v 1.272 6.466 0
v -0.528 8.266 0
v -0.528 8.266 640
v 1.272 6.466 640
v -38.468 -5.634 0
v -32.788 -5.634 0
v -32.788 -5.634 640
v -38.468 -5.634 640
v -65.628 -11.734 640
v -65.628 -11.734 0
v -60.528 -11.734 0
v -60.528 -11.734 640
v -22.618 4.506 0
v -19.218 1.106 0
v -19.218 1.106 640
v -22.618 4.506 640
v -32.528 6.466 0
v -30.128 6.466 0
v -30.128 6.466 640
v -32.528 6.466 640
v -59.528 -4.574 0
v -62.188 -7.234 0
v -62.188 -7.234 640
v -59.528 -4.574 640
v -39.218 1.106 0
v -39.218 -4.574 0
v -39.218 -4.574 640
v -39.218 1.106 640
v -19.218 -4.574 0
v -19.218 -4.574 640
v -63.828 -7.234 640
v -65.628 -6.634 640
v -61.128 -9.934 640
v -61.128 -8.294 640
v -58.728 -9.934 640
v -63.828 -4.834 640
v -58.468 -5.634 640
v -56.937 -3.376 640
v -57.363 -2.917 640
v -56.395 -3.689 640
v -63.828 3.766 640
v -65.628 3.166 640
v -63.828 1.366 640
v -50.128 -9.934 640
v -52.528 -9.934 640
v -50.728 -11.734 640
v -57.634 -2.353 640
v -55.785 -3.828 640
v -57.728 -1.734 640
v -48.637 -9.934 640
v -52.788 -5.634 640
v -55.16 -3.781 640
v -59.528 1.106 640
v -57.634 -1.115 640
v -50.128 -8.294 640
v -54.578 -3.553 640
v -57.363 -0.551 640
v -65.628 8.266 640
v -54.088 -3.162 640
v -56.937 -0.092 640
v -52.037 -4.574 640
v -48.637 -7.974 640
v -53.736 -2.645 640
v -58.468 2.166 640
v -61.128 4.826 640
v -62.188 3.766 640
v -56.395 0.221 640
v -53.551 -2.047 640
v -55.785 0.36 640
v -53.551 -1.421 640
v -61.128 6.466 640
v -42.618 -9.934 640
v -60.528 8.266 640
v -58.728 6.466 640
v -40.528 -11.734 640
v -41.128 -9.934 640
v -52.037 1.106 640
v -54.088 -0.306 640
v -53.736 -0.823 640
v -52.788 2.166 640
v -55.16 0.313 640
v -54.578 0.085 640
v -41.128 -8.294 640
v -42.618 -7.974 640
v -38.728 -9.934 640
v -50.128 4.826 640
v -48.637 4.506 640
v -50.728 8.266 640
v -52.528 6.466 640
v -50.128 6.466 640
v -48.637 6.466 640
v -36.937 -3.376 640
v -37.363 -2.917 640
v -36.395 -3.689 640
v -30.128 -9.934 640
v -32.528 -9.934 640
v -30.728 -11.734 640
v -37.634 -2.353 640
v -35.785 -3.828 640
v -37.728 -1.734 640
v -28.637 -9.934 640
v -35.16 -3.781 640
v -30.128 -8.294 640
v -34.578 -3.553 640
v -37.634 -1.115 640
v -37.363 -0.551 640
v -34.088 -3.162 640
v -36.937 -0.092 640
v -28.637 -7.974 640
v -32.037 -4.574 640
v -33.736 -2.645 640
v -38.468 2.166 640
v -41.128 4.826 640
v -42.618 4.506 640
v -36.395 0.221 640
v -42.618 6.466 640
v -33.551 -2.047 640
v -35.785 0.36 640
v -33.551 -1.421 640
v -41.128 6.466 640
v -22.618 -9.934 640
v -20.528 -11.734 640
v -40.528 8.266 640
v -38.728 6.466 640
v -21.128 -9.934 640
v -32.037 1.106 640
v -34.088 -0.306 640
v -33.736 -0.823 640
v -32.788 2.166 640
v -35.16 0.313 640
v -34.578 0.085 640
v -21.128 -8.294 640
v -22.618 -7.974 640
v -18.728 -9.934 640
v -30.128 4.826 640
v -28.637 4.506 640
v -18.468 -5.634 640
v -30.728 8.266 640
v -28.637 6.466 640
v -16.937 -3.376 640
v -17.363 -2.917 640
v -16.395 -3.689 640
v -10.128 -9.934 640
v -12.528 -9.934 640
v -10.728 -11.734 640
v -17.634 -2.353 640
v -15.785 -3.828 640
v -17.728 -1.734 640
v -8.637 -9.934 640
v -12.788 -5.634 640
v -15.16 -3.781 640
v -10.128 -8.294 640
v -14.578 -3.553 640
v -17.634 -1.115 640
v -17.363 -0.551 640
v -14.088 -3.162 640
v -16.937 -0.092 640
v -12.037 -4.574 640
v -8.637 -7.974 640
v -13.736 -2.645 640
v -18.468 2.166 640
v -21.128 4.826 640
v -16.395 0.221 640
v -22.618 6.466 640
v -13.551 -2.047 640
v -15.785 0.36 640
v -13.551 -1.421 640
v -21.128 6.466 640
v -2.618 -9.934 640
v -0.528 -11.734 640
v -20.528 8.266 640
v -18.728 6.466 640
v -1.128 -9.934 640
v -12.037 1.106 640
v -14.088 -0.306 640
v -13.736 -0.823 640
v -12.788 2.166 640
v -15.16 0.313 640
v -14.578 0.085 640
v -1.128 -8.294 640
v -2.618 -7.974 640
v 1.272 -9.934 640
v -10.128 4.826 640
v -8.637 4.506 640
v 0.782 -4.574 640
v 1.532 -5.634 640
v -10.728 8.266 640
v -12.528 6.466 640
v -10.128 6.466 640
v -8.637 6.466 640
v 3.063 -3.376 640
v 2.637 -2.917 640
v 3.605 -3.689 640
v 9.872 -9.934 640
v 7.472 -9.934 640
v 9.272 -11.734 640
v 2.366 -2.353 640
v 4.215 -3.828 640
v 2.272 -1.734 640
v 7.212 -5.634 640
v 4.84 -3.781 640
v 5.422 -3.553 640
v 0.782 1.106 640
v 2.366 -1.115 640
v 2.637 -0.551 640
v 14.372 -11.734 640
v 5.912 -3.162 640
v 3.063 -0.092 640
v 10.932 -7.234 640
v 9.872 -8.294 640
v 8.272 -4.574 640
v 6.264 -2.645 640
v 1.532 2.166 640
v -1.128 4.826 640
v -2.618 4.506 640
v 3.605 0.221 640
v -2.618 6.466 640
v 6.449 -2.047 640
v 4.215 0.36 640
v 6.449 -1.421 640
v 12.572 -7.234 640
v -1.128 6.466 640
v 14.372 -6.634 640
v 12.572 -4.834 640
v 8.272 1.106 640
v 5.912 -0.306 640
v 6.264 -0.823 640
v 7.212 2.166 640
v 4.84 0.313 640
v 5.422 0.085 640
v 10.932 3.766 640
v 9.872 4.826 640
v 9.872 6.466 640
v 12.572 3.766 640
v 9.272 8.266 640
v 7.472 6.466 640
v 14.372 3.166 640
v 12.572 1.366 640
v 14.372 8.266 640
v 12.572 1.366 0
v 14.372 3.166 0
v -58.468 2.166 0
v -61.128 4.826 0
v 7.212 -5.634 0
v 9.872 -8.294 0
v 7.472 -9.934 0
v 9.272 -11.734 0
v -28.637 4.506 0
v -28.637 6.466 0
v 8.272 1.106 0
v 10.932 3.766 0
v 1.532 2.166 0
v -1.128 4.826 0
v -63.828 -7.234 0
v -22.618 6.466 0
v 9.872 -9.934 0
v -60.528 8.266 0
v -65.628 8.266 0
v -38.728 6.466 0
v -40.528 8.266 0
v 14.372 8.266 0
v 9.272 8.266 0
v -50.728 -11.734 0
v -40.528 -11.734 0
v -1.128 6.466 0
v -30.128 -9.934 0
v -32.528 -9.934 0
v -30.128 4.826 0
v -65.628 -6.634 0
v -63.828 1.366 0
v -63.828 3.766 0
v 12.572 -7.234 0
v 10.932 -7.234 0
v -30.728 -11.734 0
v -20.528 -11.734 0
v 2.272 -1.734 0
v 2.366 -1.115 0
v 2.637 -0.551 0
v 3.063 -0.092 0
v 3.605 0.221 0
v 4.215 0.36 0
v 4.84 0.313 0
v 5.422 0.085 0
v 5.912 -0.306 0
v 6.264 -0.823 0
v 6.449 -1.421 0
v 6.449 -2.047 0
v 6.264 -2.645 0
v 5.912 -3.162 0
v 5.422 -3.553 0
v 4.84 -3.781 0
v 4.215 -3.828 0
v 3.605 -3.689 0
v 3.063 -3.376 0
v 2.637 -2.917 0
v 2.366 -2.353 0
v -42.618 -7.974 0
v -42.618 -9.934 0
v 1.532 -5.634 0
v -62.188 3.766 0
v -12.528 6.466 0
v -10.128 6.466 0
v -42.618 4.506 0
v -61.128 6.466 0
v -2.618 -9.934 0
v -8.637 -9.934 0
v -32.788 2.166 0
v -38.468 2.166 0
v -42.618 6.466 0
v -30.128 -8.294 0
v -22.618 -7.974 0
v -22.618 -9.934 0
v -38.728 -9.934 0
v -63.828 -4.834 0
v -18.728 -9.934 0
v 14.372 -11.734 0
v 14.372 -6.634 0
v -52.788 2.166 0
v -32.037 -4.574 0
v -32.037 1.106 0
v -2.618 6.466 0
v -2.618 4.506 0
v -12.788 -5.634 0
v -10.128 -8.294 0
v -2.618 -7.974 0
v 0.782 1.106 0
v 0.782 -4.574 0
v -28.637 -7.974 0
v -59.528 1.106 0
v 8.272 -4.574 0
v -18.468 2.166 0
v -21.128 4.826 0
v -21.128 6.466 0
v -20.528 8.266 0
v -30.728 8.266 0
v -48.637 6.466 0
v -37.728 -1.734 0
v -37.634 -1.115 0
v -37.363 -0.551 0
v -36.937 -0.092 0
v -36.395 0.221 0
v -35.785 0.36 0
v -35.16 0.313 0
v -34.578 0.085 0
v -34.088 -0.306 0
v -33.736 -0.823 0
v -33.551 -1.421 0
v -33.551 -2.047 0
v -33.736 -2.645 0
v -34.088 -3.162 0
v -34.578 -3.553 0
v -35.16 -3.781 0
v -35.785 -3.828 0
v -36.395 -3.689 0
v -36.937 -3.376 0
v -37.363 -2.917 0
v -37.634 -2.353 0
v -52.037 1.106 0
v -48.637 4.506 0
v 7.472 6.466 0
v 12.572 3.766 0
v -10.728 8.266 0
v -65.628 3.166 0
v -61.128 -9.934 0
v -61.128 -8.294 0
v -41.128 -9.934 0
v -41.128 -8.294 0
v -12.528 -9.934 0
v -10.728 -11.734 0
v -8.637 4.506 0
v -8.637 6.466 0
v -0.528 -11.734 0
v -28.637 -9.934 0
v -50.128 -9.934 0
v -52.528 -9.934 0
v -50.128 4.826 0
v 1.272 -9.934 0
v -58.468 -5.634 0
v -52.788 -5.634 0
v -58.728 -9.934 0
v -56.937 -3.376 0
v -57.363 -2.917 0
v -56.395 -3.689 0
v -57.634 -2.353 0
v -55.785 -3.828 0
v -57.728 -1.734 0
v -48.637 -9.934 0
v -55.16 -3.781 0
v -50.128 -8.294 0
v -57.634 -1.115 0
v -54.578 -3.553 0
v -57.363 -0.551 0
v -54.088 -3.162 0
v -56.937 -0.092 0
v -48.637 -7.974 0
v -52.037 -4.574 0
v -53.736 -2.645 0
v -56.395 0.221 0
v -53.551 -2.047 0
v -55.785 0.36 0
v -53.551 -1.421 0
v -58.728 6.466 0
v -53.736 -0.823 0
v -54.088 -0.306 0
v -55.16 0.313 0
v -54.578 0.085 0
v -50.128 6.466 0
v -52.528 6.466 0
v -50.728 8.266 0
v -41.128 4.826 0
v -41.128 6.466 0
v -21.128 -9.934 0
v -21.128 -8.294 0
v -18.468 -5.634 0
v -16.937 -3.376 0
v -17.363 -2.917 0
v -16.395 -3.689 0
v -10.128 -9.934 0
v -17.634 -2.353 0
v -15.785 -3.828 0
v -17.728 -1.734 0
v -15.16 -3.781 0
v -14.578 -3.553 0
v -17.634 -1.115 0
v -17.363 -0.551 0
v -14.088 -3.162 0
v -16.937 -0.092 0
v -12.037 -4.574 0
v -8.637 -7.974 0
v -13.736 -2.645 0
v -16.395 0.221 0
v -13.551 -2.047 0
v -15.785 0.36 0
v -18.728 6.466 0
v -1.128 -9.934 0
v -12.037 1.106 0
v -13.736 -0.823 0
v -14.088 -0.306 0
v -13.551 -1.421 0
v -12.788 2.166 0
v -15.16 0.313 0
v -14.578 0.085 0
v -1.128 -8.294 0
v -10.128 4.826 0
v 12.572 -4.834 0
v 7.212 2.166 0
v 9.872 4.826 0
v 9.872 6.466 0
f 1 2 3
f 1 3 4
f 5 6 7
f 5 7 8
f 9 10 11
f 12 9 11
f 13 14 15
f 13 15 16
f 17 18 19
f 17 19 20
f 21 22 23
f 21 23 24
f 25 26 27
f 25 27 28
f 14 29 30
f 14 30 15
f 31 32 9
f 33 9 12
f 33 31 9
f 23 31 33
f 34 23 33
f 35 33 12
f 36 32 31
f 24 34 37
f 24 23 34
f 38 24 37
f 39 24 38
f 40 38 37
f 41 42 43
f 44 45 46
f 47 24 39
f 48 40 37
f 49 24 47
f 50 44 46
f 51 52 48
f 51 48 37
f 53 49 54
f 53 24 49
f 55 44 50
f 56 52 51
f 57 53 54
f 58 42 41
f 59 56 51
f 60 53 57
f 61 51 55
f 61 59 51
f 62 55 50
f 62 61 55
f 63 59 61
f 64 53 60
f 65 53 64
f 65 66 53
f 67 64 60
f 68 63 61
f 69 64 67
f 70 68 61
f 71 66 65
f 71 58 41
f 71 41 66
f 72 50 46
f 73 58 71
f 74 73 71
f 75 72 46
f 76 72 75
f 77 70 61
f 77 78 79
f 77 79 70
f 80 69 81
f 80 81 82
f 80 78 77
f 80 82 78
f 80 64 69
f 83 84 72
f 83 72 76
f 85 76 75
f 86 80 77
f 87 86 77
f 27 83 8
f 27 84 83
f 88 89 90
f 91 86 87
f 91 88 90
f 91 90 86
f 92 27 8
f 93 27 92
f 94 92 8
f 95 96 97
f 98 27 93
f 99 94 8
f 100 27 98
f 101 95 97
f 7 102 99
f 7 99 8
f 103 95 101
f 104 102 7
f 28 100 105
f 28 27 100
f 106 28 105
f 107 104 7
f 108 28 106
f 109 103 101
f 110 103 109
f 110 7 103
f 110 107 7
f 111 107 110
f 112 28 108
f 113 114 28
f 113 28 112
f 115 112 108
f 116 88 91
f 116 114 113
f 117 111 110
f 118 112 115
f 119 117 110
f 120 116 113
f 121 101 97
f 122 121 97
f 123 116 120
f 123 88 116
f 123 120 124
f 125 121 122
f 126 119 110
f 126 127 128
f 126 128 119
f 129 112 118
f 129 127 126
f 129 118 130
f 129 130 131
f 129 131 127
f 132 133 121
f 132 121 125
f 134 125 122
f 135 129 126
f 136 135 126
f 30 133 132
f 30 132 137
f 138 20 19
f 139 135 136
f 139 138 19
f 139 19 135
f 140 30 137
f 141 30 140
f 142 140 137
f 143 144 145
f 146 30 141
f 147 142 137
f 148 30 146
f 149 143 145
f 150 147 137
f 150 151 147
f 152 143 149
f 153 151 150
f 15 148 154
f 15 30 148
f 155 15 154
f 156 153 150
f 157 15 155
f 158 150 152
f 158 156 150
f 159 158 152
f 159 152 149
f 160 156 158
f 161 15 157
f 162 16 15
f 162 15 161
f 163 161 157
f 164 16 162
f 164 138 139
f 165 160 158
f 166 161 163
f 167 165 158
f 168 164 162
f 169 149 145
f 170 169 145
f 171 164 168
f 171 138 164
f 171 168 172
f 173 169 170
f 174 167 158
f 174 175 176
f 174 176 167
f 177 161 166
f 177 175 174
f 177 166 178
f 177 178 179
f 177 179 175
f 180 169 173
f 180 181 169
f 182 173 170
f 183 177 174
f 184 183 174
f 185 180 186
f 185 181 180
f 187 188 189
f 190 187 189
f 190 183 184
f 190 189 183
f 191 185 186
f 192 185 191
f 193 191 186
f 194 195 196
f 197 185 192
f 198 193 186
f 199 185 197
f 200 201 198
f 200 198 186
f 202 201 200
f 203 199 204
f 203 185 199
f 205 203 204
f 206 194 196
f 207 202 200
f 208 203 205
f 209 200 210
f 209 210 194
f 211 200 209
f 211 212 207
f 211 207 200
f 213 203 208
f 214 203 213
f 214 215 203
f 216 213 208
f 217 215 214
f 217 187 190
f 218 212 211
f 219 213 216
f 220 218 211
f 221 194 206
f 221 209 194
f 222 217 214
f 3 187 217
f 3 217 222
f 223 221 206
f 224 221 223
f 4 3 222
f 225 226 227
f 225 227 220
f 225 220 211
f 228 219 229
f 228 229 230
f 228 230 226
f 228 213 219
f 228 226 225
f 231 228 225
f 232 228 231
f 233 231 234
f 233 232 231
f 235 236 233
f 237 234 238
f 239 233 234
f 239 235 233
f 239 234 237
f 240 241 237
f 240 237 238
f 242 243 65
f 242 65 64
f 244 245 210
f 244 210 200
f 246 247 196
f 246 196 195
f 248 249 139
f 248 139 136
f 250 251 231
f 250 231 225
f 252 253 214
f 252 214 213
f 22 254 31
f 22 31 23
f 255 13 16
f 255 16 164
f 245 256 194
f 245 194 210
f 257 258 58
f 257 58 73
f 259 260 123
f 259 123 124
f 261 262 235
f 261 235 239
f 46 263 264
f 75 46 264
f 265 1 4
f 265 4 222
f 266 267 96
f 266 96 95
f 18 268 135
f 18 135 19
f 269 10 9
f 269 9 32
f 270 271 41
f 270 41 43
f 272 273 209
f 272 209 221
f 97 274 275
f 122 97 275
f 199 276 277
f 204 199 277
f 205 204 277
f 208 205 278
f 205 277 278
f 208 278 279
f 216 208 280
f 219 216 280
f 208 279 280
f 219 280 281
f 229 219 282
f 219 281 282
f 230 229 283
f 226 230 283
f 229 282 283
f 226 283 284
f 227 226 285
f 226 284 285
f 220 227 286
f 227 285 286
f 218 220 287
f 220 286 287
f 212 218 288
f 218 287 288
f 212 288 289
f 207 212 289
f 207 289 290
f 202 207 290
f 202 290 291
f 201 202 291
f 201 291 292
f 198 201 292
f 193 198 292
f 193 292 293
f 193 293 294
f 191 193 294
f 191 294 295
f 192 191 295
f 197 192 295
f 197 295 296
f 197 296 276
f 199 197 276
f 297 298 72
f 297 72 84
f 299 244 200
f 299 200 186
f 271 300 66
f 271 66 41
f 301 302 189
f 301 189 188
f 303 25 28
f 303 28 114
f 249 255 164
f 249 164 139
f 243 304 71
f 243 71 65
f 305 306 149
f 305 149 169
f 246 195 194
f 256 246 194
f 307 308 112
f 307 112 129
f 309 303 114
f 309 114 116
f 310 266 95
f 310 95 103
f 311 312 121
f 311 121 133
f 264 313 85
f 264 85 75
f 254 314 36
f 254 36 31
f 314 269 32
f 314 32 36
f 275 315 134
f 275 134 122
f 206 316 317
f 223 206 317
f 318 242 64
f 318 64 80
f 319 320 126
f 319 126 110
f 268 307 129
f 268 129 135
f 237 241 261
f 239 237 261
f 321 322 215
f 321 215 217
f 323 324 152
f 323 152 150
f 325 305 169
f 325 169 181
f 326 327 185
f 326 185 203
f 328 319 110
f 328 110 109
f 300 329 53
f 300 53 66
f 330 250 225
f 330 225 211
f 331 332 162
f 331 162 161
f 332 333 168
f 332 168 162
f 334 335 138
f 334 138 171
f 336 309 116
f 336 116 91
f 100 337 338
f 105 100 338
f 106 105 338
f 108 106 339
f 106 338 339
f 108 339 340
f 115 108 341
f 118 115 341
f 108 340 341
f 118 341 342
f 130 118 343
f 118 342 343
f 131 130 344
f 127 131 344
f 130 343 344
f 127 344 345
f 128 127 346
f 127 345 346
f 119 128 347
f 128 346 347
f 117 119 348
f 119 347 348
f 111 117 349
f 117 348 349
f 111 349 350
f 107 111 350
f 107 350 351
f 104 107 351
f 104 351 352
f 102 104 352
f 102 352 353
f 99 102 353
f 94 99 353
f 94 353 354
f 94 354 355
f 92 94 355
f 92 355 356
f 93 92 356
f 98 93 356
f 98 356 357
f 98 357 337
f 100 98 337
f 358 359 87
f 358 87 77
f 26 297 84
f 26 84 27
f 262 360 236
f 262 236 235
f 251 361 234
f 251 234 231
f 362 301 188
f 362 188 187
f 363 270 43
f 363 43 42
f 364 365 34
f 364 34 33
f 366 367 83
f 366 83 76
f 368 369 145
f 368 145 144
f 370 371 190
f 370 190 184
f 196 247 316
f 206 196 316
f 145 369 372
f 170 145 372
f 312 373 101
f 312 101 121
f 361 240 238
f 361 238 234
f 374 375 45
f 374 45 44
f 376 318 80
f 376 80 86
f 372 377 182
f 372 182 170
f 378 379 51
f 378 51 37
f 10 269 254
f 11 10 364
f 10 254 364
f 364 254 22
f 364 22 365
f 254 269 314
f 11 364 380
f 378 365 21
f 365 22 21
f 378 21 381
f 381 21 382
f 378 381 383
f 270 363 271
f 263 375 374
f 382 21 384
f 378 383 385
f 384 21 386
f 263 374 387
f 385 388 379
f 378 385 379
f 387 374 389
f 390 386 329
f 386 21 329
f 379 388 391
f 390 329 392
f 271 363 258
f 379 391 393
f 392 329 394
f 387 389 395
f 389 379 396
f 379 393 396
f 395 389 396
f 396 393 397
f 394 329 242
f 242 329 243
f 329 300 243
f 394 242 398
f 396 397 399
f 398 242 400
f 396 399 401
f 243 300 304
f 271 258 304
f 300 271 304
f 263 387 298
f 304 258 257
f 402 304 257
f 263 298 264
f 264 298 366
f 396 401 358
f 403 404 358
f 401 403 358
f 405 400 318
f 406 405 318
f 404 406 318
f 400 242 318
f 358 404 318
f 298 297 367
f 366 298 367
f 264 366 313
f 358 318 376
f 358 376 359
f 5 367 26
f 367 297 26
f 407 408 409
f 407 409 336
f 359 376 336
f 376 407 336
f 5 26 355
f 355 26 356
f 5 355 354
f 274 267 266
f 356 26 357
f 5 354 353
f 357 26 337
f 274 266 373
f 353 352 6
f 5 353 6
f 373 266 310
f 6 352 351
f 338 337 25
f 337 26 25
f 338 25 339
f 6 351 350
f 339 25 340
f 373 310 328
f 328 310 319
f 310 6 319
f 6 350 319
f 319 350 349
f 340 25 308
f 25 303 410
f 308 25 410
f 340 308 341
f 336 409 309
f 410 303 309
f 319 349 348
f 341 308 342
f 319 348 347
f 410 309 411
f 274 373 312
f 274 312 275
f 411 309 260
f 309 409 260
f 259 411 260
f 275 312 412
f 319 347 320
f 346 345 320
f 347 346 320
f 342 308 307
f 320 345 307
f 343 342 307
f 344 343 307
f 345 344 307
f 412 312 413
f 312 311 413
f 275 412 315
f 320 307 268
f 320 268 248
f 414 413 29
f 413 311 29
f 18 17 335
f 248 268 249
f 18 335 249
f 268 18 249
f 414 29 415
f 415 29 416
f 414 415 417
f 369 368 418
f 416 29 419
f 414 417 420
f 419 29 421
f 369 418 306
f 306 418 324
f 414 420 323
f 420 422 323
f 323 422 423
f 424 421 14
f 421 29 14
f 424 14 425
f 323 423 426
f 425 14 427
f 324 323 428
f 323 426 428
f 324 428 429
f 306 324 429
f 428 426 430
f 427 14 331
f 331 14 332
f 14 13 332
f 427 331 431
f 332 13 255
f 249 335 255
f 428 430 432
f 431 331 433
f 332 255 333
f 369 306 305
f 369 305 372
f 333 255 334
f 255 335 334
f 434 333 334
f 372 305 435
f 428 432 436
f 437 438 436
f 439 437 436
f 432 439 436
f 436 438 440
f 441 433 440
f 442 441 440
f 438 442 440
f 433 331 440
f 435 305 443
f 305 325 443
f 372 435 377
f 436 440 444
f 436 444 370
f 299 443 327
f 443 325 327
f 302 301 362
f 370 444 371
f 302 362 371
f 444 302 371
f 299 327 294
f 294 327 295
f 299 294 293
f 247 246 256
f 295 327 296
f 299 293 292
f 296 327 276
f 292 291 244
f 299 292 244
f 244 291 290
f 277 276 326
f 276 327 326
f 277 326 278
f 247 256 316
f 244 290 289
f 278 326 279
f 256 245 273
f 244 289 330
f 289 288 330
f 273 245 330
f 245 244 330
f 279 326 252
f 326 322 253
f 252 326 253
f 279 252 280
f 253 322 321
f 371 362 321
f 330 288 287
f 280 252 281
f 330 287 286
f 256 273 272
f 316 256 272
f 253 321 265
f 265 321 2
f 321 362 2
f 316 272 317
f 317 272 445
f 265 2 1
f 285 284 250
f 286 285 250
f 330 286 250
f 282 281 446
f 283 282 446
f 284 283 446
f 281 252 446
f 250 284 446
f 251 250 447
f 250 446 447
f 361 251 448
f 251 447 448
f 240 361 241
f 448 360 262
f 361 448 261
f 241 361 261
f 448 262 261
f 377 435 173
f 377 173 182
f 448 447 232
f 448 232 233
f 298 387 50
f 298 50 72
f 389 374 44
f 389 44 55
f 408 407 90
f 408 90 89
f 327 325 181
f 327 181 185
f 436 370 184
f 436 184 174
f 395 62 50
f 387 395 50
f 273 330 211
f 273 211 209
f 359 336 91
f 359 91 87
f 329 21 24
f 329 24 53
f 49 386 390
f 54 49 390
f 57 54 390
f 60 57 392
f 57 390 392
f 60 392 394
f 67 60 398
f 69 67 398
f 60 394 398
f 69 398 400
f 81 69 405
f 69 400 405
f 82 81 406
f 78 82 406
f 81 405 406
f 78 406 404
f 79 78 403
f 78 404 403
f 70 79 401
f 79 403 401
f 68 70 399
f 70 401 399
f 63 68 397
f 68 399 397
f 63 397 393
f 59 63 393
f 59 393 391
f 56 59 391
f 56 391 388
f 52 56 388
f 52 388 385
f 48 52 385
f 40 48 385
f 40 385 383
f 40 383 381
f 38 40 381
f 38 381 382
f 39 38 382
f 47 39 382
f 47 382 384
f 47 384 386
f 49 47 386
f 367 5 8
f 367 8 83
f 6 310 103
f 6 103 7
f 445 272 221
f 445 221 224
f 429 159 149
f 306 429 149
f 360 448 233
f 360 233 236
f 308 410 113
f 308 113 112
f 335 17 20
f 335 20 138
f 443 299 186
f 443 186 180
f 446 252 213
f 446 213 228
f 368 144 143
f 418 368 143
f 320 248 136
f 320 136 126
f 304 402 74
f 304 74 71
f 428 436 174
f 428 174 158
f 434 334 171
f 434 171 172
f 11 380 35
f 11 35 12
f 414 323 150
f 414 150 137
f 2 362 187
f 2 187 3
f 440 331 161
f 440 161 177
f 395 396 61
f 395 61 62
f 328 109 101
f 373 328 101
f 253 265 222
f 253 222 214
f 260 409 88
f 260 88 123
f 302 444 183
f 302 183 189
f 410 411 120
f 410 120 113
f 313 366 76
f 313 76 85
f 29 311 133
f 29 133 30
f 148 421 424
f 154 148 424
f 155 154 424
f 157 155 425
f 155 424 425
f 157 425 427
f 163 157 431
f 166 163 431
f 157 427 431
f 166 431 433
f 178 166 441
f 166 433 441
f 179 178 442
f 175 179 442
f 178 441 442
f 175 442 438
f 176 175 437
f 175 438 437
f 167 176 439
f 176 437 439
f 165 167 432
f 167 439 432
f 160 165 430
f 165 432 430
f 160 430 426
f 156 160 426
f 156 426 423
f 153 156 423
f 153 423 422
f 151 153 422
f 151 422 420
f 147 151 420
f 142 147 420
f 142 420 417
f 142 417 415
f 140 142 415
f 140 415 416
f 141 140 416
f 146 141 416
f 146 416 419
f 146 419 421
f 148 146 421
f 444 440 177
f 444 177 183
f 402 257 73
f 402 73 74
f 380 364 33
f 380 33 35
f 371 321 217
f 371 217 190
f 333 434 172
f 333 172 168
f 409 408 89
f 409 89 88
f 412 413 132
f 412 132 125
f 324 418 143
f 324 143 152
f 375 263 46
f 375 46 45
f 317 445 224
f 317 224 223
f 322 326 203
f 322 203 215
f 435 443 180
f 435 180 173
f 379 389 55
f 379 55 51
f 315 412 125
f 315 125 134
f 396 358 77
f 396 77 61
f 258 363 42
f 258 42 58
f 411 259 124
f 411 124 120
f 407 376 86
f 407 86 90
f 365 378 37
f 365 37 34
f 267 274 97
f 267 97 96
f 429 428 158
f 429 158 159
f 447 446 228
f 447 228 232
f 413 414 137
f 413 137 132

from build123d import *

# Parameters (mm, degrees)
ESQUISSE1_W             = 80
ESQUISSE1_H             = 20
BOSS_EXTRU_1_DEPTH      = 640
ENL_V_MAT_EXTRU_1_REACH = 645.463
ESQUISSE2_R             = 2.1
ENL_V_MAT_EXTRU_2_REACH = 645.463


with BuildPart() as part:
    # Esquisse1 → Boss.-Extru.1 (new body)
    with BuildSketch(Plane.XY):
        with Locations((-25.62771875, -1.733873274)):
            Rectangle(ESQUISSE1_W, ESQUISSE1_H)
    extrude(amount=BOSS_EXTRU_1_DEPTH)

    # Esquisse2 → Enlèv. mat.-Extru.1 (cut, up to next)
    with BuildSketch(Plane(origin=(0, 0, 0), x_dir=(-1, 0, 0), z_dir=(0, 0, -1)), mode=Mode.PRIVATE) as enl_v_mat_extru_1_sk1:
        with Locations((55.62771875, -1.733873274)):
            Circle(ESQUISSE2_R)
    enl_v_mat_extru_1_tool1 = extrude(enl_v_mat_extru_1_sk1.sketch, amount=-ENL_V_MAT_EXTRU_1_REACH, mode=Mode.PRIVATE) & part.part
    # Esquisse2 → Enlèv. mat.-Extru.1 (cut, up to next)
    with BuildSketch(Plane(origin=(0, 0, 0), x_dir=(-1, 0, 0), z_dir=(0, 0, -1)), mode=Mode.PRIVATE) as enl_v_mat_extru_1_sk2:
        with Locations((35.62771875, -1.733873274)):
            Circle(ESQUISSE2_R)
    enl_v_mat_extru_1_tool2 = extrude(enl_v_mat_extru_1_sk2.sketch, amount=-ENL_V_MAT_EXTRU_1_REACH, mode=Mode.PRIVATE) & part.part
    # Esquisse2 → Enlèv. mat.-Extru.1 (cut, up to next)
    with BuildSketch(Plane(origin=(0, 0, 0), x_dir=(-1, 0, 0), z_dir=(0, 0, -1)), mode=Mode.PRIVATE) as enl_v_mat_extru_1_sk3:
        with Locations((15.62771875, -1.733873274)):
            Circle(ESQUISSE2_R)
    enl_v_mat_extru_1_tool3 = extrude(enl_v_mat_extru_1_sk3.sketch, amount=-ENL_V_MAT_EXTRU_1_REACH, mode=Mode.PRIVATE) & part.part
    # Esquisse2 → Enlèv. mat.-Extru.1 (cut, up to next)
    with BuildSketch(Plane(origin=(0, 0, 0), x_dir=(-1, 0, 0), z_dir=(0, 0, -1)), mode=Mode.PRIVATE) as enl_v_mat_extru_1_sk4:
        with Locations((-4.37228125, -1.733873274)):
            Circle(ESQUISSE2_R)
    enl_v_mat_extru_1_tool4 = extrude(enl_v_mat_extru_1_sk4.sketch, amount=-ENL_V_MAT_EXTRU_1_REACH, mode=Mode.PRIVATE) & part.part
    # Esquisse2 → Enlèv. mat.-Extru.1 (cut, up to next)
    with BuildSketch(Plane(origin=(0, 0, 0), x_dir=(-1, 0, 0), z_dir=(0, 0, -1)), mode=Mode.PRIVATE) as enl_v_mat_extru_1_sk5:
        Polygon((50.72771875, 8.266126726), (60.52771875, 8.266126726), (58.72771875, 6.466126726), (61.12771875, 6.466126726), (61.12771875, 4.826126726), (58.46771875, 2.166126726), (52.78771875, 2.166126726), (50.12771875, 4.826126726), (50.12771875, 6.466126726), (52.52771875, 6.466126726), align=None)
    enl_v_mat_extru_1_tool5 = extrude(enl_v_mat_extru_1_sk5.sketch, amount=-ENL_V_MAT_EXTRU_1_REACH, mode=Mode.PRIVATE) & part.part
    # Esquisse2 → Enlèv. mat.-Extru.1 (cut, up to next)
    with BuildSketch(Plane(origin=(0, 0, 0), x_dir=(-1, 0, 0), z_dir=(0, 0, -1)), mode=Mode.PRIVATE) as enl_v_mat_extru_1_sk6:
        Polygon((65.62771875, 3.166126726), (65.62771875, -6.633873274), (63.82771875, -4.833873274), (63.82771875, -7.233873274), (62.18771875, -7.233873274), (59.52771875, -4.573873274), (59.52771875, 1.106126726), (62.18771875, 3.766126726), (63.82771875, 3.766126726), (63.82771875, 1.366126726), align=None)
    enl_v_mat_extru_1_tool6 = extrude(enl_v_mat_extru_1_sk6.sketch, amount=-ENL_V_MAT_EXTRU_1_REACH, mode=Mode.PRIVATE) & part.part
    # Esquisse2 → Enlèv. mat.-Extru.1 (cut, up to next)
    with BuildSketch(Plane(origin=(0, 0, 0), x_dir=(-1, 0, 0), z_dir=(0, 0, -1)), mode=Mode.PRIVATE) as enl_v_mat_extru_1_sk7:
        Polygon((60.52771875, -11.733873274), (50.72771875, -11.733873274), (52.52771875, -9.933873274), (50.12771875, -9.933873274), (50.12771875, -8.293873274), (52.78771875, -5.633873274), (58.46771875, -5.633873274), (61.12771875, -8.293873274), (61.12771875, -9.933873274), (58.72771875, -9.933873274), align=None)
    enl_v_mat_extru_1_tool7 = extrude(enl_v_mat_extru_1_sk7.sketch, amount=-ENL_V_MAT_EXTRU_1_REACH, mode=Mode.PRIVATE) & part.part
    # Esquisse2 → Enlèv. mat.-Extru.1 (cut, up to next)
    with BuildSketch(Plane(origin=(0, 0, 0), x_dir=(-1, 0, 0), z_dir=(0, 0, -1)), mode=Mode.PRIVATE) as enl_v_mat_extru_1_sk8:
        Polygon((30.72771875, 8.266126726), (40.52771875, 8.266126726), (38.72771875, 6.466126726), (41.12771875, 6.466126726), (41.12771875, 4.826126726), (38.46771875, 2.166126726), (32.78771875, 2.166126726), (30.12771875, 4.826126726), (30.12771875, 6.466126726), (32.52771875, 6.466126726), align=None)
    enl_v_mat_extru_1_tool8 = extrude(enl_v_mat_extru_1_sk8.sketch, amount=-ENL_V_MAT_EXTRU_1_REACH, mode=Mode.PRIVATE) & part.part
    # Esquisse2 → Enlèv. mat.-Extru.1 (cut, up to next)
    with BuildSketch(Plane(origin=(0, 0, 0), x_dir=(-1, 0, 0), z_dir=(0, 0, -1)), mode=Mode.PRIVATE) as enl_v_mat_extru_1_sk9:
        Polygon((40.52771875, -11.733873274), (30.72771875, -11.733873274), (32.52771875, -9.933873274), (30.12771875, -9.933873274), (30.12771875, -8.293873274), (32.78771875, -5.633873274), (38.46771875, -5.633873274), (41.12771875, -8.293873274), (41.12771875, -9.933873274), (38.72771875, -9.933873274), align=None)
    enl_v_mat_extru_1_tool9 = extrude(enl_v_mat_extru_1_sk9.sketch, amount=-ENL_V_MAT_EXTRU_1_REACH, mode=Mode.PRIVATE) & part.part
    # Esquisse2 → Enlèv. mat.-Extru.1 (cut, up to next)
    with BuildSketch(Plane(origin=(0, 0, 0), x_dir=(-1, 0, 0), z_dir=(0, 0, -1)), mode=Mode.PRIVATE) as enl_v_mat_extru_1_sk10:
        Polygon((10.72771875, 8.266126726), (20.52771875, 8.266126726), (18.72771875, 6.466126726), (21.12771875, 6.466126726), (21.12771875, 4.826126726), (18.46771875, 2.166126726), (12.78771875, 2.166126726), (10.12771875, 4.826126726), (10.12771875, 6.466126726), (12.52771875, 6.466126726), align=None)
    enl_v_mat_extru_1_tool10 = extrude(enl_v_mat_extru_1_sk10.sketch, amount=-ENL_V_MAT_EXTRU_1_REACH, mode=Mode.PRIVATE) & part.part
    # Esquisse2 → Enlèv. mat.-Extru.1 (cut, up to next)
    with BuildSketch(Plane(origin=(0, 0, 0), x_dir=(-1, 0, 0), z_dir=(0, 0, -1)), mode=Mode.PRIVATE) as enl_v_mat_extru_1_sk11:
        Polygon((20.52771875, -11.733873274), (10.72771875, -11.733873274), (12.52771875, -9.933873274), (10.12771875, -9.933873274), (10.12771875, -8.293873274), (12.78771875, -5.633873274), (18.46771875, -5.633873274), (21.12771875, -8.293873274), (21.12771875, -9.933873274), (18.72771875, -9.933873274), align=None)
    enl_v_mat_extru_1_tool11 = extrude(enl_v_mat_extru_1_sk11.sketch, amount=-ENL_V_MAT_EXTRU_1_REACH, mode=Mode.PRIVATE) & part.part
    # Esquisse2 → Enlèv. mat.-Extru.1 (cut, up to next)
    with BuildSketch(Plane(origin=(0, 0, 0), x_dir=(-1, 0, 0), z_dir=(0, 0, -1)), mode=Mode.PRIVATE) as enl_v_mat_extru_1_sk12:
        Polygon((-9.27228125, 8.266126726), (0.52771875, 8.266126726), (-1.27228125, 6.466126726), (1.12771875, 6.466126726), (1.12771875, 4.826126726), (-1.53228125, 2.166126726), (-7.21228125, 2.166126726), (-9.87228125, 4.826126726), (-9.87228125, 6.466126726), (-7.47228125, 6.466126726), align=None)
    enl_v_mat_extru_1_tool12 = extrude(enl_v_mat_extru_1_sk12.sketch, amount=-ENL_V_MAT_EXTRU_1_REACH, mode=Mode.PRIVATE) & part.part
    # Esquisse2 → Enlèv. mat.-Extru.1 (cut, up to next)
    with BuildSketch(Plane(origin=(0, 0, 0), x_dir=(-1, 0, 0), z_dir=(0, 0, -1)), mode=Mode.PRIVATE) as enl_v_mat_extru_1_sk13:
        Polygon((0.52771875, -11.733873274), (-9.27228125, -11.733873274), (-7.47228125, -9.933873274), (-9.87228125, -9.933873274), (-9.87228125, -8.293873274), (-7.21228125, -5.633873274), (-1.53228125, -5.633873274), (1.12771875, -8.293873274), (1.12771875, -9.933873274), (-1.27228125, -9.933873274), align=None)
    enl_v_mat_extru_1_tool13 = extrude(enl_v_mat_extru_1_sk13.sketch, amount=-ENL_V_MAT_EXTRU_1_REACH, mode=Mode.PRIVATE) & part.part
    # Esquisse2 → Enlèv. mat.-Extru.1 (cut, up to next)
    with BuildSketch(Plane(origin=(0, 0, 0), x_dir=(-1, 0, 0), z_dir=(0, 0, -1)), mode=Mode.PRIVATE) as enl_v_mat_extru_1_sk14:
        Polygon((-14.37228125, -6.633873274), (-14.37228125, 3.166126726), (-12.57228125, 1.366126726), (-12.57228125, 3.766126726), (-10.93228125, 3.766126726), (-8.27228125, 1.106126726), (-8.27228125, -4.573873274), (-10.93228125, -7.233873274), (-12.57228125, -7.233873274), (-12.57228125, -4.833873274), align=None)
    enl_v_mat_extru_1_tool14 = extrude(enl_v_mat_extru_1_sk14.sketch, amount=-ENL_V_MAT_EXTRU_1_REACH, mode=Mode.PRIVATE) & part.part
    add(enl_v_mat_extru_1_tool1.solids().sort_by_distance((-55.627719, -1.733873, 0))[0], mode=Mode.SUBTRACT)
    add(enl_v_mat_extru_1_tool2.solids().sort_by_distance((-35.627719, -1.733873, 0))[0], mode=Mode.SUBTRACT)
    add(enl_v_mat_extru_1_tool3.solids().sort_by_distance((-15.627719, -1.733873, 0))[0], mode=Mode.SUBTRACT)
    add(enl_v_mat_extru_1_tool4.solids().sort_by_distance((4.372281, -1.733873, 0))[0], mode=Mode.SUBTRACT)
    add(enl_v_mat_extru_1_tool5.solids().sort_by_distance((-55.627719, 5.301599, 0))[0], mode=Mode.SUBTRACT)
    add(enl_v_mat_extru_1_tool6.solids().sort_by_distance((-62.663191, -1.733873, 0))[0], mode=Mode.SUBTRACT)
    add(enl_v_mat_extru_1_tool7.solids().sort_by_distance((-55.627719, -8.769346, 0))[0], mode=Mode.SUBTRACT)
    add(enl_v_mat_extru_1_tool8.solids().sort_by_distance((-35.627719, 5.301599, 0))[0], mode=Mode.SUBTRACT)
    add(enl_v_mat_extru_1_tool9.solids().sort_by_distance((-35.627719, -8.769346, 0))[0], mode=Mode.SUBTRACT)
    add(enl_v_mat_extru_1_tool10.solids().sort_by_distance((-15.627719, 5.301599, 0))[0], mode=Mode.SUBTRACT)
    add(enl_v_mat_extru_1_tool11.solids().sort_by_distance((-15.627719, -8.769346, 0))[0], mode=Mode.SUBTRACT)
    add(enl_v_mat_extru_1_tool12.solids().sort_by_distance((4.372281, 5.301599, 0))[0], mode=Mode.SUBTRACT)
    add(enl_v_mat_extru_1_tool13.solids().sort_by_distance((4.372281, -8.769346, 0))[0], mode=Mode.SUBTRACT)
    add(enl_v_mat_extru_1_tool14.solids().sort_by_distance((11.407754, -1.733873, 0))[0], mode=Mode.SUBTRACT)

    # Esquisse3 → Enlèv. mat.-Extru.2 (cut, up to next)
    with BuildSketch(Plane(origin=(0, 0, 0), x_dir=(-1, 0, 0), z_dir=(0, 0, -1)), mode=Mode.PRIVATE) as enl_v_mat_extru_2_sk1:
        Polygon((2.618256699, 6.466126726), (8.637180802, 6.466126726), (8.637180802, 4.506126726), (12.037180802, 1.106126726), (12.037180802, -4.573873274), (8.637180802, -7.973873274), (8.637180802, -9.933873274), (2.618256699, -9.933873274), (2.618256699, -7.973873274), (-0.781743301, -4.573873274), (-0.781743301, 1.106126726), (2.618256699, 4.506126726), align=None)
    enl_v_mat_extru_2_tool1 = extrude(enl_v_mat_extru_2_sk1.sketch, amount=-ENL_V_MAT_EXTRU_2_REACH, mode=Mode.PRIVATE) & part.part
    # Esquisse3 → Enlèv. mat.-Extru.2 (cut, up to next)
    with BuildSketch(Plane(origin=(0, 0, 0), x_dir=(-1, 0, 0), z_dir=(0, 0, -1)), mode=Mode.PRIVATE) as enl_v_mat_extru_2_sk2:
        Polygon((22.618256699, 6.466126726), (28.637180802, 6.466126726), (28.637180802, 4.506126726), (32.037180802, 1.106126726), (32.037180802, -4.573873274), (28.637180802, -7.973873274), (28.637180802, -9.933873274), (22.618256699, -9.933873274), (22.618256699, -7.973873274), (19.218256699, -4.573873274), (19.218256699, 1.106126726), (22.618256699, 4.506126726), align=None)
    enl_v_mat_extru_2_tool2 = extrude(enl_v_mat_extru_2_sk2.sketch, amount=-ENL_V_MAT_EXTRU_2_REACH, mode=Mode.PRIVATE) & part.part
    # Esquisse3 → Enlèv. mat.-Extru.2 (cut, up to next)
    with BuildSketch(Plane(origin=(0, 0, 0), x_dir=(-1, 0, 0), z_dir=(0, 0, -1)), mode=Mode.PRIVATE) as enl_v_mat_extru_2_sk3:
        Polygon((42.618256699, 6.466126726), (48.637180802, 6.466126726), (48.637180802, 4.506126726), (52.037180802, 1.106126726), (52.037180802, -4.573873274), (48.637180802, -7.973873274), (48.637180802, -9.933873274), (42.618256699, -9.933873274), (42.618256699, -7.973873274), (39.218256699, -4.573873274), (39.218256699, 1.106126726), (42.618256699, 4.506126726), align=None)
    enl_v_mat_extru_2_tool3 = extrude(enl_v_mat_extru_2_sk3.sketch, amount=-ENL_V_MAT_EXTRU_2_REACH, mode=Mode.PRIVATE) & part.part
    add(enl_v_mat_extru_2_tool1.solids().sort_by_distance((-5.627719, -1.733873, 0))[0], mode=Mode.SUBTRACT)
    add(enl_v_mat_extru_2_tool2.solids().sort_by_distance((-25.627719, -1.733873, 0))[0], mode=Mode.SUBTRACT)
    add(enl_v_mat_extru_2_tool3.solids().sort_by_distance((-45.627719, -1.733873, 0))[0], mode=Mode.SUBTRACT)


solid = part.part
